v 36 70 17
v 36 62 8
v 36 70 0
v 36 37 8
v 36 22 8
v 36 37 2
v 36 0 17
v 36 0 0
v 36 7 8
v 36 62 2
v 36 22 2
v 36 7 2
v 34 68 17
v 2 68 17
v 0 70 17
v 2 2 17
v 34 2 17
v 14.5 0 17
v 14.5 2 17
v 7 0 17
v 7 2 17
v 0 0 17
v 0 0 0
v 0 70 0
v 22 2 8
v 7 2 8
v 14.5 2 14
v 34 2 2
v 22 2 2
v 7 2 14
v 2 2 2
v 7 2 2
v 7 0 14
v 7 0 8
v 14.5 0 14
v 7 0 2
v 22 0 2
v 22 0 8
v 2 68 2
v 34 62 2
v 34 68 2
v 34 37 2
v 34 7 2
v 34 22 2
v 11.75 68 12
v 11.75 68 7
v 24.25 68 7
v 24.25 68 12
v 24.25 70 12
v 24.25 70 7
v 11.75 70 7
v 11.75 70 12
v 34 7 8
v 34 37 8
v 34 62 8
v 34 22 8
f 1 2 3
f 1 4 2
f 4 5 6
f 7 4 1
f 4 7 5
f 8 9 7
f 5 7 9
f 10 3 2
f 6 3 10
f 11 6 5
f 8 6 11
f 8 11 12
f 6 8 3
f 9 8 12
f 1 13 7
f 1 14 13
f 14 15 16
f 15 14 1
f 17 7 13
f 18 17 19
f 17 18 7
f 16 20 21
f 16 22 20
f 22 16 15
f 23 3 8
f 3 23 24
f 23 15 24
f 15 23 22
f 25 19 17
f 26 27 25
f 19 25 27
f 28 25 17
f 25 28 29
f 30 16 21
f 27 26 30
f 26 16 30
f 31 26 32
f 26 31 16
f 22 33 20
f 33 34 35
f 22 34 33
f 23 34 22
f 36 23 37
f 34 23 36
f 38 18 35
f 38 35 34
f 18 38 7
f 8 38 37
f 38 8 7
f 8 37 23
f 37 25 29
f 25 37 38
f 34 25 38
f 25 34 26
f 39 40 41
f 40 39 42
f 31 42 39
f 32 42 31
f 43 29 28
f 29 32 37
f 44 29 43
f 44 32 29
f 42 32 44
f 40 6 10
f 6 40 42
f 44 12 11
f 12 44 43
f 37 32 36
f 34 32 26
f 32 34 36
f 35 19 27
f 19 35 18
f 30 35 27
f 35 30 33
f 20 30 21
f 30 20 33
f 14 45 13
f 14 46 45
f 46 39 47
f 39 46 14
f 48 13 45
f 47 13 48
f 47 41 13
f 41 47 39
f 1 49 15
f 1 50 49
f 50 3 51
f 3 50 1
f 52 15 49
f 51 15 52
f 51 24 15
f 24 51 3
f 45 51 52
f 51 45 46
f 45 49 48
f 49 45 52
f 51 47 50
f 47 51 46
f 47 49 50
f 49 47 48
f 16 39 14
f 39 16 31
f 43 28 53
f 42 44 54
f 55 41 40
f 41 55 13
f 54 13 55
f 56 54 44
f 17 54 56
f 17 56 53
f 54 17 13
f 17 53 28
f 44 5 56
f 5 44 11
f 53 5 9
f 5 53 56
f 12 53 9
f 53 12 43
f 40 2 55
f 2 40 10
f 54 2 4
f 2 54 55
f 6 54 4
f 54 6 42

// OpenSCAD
l=66;
w=32;
h=15;
t=2;

slot=0;
trim=0;

module cutout(x,z,len,height)
{
    translate([x+t,-t,z+t]){
        cube([len,3*t,height]);
    }
}

// Bottom
cube([w+2*t,l+2*t,t]);


// Front
translate([0,0,0]){
    rotate([0,0,0]){ 
        difference(){
           cube([w+2*t,t,h+t]);
            
           translate([0,-t,h+t-trim]){
               cube([w*2*t,3*t,trim]);
           }
           cutout(5,0,15,6);
           cutout(5,12,7.5,3);
        }
    }
}

// Back
translate([w+2*t,l+2*t,0]){
    rotate([0,0,180]){
        difference(){
           cube([w+2*t,t,h+t]);
            
            cutout(9.75,5,12.5,5);
        }
    }
}

// Left
translate([0,l+2*t,0]){
    rotate([0,0,-90]){ 
        difference() {
           cube([l+2*t,t,h+t]);
           translate([0,t-slot,h+t-slot-1]){
               cube([l+2*t,slot+.2,slot]);
           }
            //cutout(40,0,25,6);
        }
    }
}

// Right
translate([w+2*t,0,0]){
    rotate([0,0,90]){
        difference(){ 
           cube([l+2*t,t,h+t]);
            
            translate([0,t-slot,h+t-slot-1]){
               cube([l+2*t,slot+0.2,slot]);
           }
            cutout(5,0,15,6);
            cutout(35,0,25,6);
            
        }
    }
}
